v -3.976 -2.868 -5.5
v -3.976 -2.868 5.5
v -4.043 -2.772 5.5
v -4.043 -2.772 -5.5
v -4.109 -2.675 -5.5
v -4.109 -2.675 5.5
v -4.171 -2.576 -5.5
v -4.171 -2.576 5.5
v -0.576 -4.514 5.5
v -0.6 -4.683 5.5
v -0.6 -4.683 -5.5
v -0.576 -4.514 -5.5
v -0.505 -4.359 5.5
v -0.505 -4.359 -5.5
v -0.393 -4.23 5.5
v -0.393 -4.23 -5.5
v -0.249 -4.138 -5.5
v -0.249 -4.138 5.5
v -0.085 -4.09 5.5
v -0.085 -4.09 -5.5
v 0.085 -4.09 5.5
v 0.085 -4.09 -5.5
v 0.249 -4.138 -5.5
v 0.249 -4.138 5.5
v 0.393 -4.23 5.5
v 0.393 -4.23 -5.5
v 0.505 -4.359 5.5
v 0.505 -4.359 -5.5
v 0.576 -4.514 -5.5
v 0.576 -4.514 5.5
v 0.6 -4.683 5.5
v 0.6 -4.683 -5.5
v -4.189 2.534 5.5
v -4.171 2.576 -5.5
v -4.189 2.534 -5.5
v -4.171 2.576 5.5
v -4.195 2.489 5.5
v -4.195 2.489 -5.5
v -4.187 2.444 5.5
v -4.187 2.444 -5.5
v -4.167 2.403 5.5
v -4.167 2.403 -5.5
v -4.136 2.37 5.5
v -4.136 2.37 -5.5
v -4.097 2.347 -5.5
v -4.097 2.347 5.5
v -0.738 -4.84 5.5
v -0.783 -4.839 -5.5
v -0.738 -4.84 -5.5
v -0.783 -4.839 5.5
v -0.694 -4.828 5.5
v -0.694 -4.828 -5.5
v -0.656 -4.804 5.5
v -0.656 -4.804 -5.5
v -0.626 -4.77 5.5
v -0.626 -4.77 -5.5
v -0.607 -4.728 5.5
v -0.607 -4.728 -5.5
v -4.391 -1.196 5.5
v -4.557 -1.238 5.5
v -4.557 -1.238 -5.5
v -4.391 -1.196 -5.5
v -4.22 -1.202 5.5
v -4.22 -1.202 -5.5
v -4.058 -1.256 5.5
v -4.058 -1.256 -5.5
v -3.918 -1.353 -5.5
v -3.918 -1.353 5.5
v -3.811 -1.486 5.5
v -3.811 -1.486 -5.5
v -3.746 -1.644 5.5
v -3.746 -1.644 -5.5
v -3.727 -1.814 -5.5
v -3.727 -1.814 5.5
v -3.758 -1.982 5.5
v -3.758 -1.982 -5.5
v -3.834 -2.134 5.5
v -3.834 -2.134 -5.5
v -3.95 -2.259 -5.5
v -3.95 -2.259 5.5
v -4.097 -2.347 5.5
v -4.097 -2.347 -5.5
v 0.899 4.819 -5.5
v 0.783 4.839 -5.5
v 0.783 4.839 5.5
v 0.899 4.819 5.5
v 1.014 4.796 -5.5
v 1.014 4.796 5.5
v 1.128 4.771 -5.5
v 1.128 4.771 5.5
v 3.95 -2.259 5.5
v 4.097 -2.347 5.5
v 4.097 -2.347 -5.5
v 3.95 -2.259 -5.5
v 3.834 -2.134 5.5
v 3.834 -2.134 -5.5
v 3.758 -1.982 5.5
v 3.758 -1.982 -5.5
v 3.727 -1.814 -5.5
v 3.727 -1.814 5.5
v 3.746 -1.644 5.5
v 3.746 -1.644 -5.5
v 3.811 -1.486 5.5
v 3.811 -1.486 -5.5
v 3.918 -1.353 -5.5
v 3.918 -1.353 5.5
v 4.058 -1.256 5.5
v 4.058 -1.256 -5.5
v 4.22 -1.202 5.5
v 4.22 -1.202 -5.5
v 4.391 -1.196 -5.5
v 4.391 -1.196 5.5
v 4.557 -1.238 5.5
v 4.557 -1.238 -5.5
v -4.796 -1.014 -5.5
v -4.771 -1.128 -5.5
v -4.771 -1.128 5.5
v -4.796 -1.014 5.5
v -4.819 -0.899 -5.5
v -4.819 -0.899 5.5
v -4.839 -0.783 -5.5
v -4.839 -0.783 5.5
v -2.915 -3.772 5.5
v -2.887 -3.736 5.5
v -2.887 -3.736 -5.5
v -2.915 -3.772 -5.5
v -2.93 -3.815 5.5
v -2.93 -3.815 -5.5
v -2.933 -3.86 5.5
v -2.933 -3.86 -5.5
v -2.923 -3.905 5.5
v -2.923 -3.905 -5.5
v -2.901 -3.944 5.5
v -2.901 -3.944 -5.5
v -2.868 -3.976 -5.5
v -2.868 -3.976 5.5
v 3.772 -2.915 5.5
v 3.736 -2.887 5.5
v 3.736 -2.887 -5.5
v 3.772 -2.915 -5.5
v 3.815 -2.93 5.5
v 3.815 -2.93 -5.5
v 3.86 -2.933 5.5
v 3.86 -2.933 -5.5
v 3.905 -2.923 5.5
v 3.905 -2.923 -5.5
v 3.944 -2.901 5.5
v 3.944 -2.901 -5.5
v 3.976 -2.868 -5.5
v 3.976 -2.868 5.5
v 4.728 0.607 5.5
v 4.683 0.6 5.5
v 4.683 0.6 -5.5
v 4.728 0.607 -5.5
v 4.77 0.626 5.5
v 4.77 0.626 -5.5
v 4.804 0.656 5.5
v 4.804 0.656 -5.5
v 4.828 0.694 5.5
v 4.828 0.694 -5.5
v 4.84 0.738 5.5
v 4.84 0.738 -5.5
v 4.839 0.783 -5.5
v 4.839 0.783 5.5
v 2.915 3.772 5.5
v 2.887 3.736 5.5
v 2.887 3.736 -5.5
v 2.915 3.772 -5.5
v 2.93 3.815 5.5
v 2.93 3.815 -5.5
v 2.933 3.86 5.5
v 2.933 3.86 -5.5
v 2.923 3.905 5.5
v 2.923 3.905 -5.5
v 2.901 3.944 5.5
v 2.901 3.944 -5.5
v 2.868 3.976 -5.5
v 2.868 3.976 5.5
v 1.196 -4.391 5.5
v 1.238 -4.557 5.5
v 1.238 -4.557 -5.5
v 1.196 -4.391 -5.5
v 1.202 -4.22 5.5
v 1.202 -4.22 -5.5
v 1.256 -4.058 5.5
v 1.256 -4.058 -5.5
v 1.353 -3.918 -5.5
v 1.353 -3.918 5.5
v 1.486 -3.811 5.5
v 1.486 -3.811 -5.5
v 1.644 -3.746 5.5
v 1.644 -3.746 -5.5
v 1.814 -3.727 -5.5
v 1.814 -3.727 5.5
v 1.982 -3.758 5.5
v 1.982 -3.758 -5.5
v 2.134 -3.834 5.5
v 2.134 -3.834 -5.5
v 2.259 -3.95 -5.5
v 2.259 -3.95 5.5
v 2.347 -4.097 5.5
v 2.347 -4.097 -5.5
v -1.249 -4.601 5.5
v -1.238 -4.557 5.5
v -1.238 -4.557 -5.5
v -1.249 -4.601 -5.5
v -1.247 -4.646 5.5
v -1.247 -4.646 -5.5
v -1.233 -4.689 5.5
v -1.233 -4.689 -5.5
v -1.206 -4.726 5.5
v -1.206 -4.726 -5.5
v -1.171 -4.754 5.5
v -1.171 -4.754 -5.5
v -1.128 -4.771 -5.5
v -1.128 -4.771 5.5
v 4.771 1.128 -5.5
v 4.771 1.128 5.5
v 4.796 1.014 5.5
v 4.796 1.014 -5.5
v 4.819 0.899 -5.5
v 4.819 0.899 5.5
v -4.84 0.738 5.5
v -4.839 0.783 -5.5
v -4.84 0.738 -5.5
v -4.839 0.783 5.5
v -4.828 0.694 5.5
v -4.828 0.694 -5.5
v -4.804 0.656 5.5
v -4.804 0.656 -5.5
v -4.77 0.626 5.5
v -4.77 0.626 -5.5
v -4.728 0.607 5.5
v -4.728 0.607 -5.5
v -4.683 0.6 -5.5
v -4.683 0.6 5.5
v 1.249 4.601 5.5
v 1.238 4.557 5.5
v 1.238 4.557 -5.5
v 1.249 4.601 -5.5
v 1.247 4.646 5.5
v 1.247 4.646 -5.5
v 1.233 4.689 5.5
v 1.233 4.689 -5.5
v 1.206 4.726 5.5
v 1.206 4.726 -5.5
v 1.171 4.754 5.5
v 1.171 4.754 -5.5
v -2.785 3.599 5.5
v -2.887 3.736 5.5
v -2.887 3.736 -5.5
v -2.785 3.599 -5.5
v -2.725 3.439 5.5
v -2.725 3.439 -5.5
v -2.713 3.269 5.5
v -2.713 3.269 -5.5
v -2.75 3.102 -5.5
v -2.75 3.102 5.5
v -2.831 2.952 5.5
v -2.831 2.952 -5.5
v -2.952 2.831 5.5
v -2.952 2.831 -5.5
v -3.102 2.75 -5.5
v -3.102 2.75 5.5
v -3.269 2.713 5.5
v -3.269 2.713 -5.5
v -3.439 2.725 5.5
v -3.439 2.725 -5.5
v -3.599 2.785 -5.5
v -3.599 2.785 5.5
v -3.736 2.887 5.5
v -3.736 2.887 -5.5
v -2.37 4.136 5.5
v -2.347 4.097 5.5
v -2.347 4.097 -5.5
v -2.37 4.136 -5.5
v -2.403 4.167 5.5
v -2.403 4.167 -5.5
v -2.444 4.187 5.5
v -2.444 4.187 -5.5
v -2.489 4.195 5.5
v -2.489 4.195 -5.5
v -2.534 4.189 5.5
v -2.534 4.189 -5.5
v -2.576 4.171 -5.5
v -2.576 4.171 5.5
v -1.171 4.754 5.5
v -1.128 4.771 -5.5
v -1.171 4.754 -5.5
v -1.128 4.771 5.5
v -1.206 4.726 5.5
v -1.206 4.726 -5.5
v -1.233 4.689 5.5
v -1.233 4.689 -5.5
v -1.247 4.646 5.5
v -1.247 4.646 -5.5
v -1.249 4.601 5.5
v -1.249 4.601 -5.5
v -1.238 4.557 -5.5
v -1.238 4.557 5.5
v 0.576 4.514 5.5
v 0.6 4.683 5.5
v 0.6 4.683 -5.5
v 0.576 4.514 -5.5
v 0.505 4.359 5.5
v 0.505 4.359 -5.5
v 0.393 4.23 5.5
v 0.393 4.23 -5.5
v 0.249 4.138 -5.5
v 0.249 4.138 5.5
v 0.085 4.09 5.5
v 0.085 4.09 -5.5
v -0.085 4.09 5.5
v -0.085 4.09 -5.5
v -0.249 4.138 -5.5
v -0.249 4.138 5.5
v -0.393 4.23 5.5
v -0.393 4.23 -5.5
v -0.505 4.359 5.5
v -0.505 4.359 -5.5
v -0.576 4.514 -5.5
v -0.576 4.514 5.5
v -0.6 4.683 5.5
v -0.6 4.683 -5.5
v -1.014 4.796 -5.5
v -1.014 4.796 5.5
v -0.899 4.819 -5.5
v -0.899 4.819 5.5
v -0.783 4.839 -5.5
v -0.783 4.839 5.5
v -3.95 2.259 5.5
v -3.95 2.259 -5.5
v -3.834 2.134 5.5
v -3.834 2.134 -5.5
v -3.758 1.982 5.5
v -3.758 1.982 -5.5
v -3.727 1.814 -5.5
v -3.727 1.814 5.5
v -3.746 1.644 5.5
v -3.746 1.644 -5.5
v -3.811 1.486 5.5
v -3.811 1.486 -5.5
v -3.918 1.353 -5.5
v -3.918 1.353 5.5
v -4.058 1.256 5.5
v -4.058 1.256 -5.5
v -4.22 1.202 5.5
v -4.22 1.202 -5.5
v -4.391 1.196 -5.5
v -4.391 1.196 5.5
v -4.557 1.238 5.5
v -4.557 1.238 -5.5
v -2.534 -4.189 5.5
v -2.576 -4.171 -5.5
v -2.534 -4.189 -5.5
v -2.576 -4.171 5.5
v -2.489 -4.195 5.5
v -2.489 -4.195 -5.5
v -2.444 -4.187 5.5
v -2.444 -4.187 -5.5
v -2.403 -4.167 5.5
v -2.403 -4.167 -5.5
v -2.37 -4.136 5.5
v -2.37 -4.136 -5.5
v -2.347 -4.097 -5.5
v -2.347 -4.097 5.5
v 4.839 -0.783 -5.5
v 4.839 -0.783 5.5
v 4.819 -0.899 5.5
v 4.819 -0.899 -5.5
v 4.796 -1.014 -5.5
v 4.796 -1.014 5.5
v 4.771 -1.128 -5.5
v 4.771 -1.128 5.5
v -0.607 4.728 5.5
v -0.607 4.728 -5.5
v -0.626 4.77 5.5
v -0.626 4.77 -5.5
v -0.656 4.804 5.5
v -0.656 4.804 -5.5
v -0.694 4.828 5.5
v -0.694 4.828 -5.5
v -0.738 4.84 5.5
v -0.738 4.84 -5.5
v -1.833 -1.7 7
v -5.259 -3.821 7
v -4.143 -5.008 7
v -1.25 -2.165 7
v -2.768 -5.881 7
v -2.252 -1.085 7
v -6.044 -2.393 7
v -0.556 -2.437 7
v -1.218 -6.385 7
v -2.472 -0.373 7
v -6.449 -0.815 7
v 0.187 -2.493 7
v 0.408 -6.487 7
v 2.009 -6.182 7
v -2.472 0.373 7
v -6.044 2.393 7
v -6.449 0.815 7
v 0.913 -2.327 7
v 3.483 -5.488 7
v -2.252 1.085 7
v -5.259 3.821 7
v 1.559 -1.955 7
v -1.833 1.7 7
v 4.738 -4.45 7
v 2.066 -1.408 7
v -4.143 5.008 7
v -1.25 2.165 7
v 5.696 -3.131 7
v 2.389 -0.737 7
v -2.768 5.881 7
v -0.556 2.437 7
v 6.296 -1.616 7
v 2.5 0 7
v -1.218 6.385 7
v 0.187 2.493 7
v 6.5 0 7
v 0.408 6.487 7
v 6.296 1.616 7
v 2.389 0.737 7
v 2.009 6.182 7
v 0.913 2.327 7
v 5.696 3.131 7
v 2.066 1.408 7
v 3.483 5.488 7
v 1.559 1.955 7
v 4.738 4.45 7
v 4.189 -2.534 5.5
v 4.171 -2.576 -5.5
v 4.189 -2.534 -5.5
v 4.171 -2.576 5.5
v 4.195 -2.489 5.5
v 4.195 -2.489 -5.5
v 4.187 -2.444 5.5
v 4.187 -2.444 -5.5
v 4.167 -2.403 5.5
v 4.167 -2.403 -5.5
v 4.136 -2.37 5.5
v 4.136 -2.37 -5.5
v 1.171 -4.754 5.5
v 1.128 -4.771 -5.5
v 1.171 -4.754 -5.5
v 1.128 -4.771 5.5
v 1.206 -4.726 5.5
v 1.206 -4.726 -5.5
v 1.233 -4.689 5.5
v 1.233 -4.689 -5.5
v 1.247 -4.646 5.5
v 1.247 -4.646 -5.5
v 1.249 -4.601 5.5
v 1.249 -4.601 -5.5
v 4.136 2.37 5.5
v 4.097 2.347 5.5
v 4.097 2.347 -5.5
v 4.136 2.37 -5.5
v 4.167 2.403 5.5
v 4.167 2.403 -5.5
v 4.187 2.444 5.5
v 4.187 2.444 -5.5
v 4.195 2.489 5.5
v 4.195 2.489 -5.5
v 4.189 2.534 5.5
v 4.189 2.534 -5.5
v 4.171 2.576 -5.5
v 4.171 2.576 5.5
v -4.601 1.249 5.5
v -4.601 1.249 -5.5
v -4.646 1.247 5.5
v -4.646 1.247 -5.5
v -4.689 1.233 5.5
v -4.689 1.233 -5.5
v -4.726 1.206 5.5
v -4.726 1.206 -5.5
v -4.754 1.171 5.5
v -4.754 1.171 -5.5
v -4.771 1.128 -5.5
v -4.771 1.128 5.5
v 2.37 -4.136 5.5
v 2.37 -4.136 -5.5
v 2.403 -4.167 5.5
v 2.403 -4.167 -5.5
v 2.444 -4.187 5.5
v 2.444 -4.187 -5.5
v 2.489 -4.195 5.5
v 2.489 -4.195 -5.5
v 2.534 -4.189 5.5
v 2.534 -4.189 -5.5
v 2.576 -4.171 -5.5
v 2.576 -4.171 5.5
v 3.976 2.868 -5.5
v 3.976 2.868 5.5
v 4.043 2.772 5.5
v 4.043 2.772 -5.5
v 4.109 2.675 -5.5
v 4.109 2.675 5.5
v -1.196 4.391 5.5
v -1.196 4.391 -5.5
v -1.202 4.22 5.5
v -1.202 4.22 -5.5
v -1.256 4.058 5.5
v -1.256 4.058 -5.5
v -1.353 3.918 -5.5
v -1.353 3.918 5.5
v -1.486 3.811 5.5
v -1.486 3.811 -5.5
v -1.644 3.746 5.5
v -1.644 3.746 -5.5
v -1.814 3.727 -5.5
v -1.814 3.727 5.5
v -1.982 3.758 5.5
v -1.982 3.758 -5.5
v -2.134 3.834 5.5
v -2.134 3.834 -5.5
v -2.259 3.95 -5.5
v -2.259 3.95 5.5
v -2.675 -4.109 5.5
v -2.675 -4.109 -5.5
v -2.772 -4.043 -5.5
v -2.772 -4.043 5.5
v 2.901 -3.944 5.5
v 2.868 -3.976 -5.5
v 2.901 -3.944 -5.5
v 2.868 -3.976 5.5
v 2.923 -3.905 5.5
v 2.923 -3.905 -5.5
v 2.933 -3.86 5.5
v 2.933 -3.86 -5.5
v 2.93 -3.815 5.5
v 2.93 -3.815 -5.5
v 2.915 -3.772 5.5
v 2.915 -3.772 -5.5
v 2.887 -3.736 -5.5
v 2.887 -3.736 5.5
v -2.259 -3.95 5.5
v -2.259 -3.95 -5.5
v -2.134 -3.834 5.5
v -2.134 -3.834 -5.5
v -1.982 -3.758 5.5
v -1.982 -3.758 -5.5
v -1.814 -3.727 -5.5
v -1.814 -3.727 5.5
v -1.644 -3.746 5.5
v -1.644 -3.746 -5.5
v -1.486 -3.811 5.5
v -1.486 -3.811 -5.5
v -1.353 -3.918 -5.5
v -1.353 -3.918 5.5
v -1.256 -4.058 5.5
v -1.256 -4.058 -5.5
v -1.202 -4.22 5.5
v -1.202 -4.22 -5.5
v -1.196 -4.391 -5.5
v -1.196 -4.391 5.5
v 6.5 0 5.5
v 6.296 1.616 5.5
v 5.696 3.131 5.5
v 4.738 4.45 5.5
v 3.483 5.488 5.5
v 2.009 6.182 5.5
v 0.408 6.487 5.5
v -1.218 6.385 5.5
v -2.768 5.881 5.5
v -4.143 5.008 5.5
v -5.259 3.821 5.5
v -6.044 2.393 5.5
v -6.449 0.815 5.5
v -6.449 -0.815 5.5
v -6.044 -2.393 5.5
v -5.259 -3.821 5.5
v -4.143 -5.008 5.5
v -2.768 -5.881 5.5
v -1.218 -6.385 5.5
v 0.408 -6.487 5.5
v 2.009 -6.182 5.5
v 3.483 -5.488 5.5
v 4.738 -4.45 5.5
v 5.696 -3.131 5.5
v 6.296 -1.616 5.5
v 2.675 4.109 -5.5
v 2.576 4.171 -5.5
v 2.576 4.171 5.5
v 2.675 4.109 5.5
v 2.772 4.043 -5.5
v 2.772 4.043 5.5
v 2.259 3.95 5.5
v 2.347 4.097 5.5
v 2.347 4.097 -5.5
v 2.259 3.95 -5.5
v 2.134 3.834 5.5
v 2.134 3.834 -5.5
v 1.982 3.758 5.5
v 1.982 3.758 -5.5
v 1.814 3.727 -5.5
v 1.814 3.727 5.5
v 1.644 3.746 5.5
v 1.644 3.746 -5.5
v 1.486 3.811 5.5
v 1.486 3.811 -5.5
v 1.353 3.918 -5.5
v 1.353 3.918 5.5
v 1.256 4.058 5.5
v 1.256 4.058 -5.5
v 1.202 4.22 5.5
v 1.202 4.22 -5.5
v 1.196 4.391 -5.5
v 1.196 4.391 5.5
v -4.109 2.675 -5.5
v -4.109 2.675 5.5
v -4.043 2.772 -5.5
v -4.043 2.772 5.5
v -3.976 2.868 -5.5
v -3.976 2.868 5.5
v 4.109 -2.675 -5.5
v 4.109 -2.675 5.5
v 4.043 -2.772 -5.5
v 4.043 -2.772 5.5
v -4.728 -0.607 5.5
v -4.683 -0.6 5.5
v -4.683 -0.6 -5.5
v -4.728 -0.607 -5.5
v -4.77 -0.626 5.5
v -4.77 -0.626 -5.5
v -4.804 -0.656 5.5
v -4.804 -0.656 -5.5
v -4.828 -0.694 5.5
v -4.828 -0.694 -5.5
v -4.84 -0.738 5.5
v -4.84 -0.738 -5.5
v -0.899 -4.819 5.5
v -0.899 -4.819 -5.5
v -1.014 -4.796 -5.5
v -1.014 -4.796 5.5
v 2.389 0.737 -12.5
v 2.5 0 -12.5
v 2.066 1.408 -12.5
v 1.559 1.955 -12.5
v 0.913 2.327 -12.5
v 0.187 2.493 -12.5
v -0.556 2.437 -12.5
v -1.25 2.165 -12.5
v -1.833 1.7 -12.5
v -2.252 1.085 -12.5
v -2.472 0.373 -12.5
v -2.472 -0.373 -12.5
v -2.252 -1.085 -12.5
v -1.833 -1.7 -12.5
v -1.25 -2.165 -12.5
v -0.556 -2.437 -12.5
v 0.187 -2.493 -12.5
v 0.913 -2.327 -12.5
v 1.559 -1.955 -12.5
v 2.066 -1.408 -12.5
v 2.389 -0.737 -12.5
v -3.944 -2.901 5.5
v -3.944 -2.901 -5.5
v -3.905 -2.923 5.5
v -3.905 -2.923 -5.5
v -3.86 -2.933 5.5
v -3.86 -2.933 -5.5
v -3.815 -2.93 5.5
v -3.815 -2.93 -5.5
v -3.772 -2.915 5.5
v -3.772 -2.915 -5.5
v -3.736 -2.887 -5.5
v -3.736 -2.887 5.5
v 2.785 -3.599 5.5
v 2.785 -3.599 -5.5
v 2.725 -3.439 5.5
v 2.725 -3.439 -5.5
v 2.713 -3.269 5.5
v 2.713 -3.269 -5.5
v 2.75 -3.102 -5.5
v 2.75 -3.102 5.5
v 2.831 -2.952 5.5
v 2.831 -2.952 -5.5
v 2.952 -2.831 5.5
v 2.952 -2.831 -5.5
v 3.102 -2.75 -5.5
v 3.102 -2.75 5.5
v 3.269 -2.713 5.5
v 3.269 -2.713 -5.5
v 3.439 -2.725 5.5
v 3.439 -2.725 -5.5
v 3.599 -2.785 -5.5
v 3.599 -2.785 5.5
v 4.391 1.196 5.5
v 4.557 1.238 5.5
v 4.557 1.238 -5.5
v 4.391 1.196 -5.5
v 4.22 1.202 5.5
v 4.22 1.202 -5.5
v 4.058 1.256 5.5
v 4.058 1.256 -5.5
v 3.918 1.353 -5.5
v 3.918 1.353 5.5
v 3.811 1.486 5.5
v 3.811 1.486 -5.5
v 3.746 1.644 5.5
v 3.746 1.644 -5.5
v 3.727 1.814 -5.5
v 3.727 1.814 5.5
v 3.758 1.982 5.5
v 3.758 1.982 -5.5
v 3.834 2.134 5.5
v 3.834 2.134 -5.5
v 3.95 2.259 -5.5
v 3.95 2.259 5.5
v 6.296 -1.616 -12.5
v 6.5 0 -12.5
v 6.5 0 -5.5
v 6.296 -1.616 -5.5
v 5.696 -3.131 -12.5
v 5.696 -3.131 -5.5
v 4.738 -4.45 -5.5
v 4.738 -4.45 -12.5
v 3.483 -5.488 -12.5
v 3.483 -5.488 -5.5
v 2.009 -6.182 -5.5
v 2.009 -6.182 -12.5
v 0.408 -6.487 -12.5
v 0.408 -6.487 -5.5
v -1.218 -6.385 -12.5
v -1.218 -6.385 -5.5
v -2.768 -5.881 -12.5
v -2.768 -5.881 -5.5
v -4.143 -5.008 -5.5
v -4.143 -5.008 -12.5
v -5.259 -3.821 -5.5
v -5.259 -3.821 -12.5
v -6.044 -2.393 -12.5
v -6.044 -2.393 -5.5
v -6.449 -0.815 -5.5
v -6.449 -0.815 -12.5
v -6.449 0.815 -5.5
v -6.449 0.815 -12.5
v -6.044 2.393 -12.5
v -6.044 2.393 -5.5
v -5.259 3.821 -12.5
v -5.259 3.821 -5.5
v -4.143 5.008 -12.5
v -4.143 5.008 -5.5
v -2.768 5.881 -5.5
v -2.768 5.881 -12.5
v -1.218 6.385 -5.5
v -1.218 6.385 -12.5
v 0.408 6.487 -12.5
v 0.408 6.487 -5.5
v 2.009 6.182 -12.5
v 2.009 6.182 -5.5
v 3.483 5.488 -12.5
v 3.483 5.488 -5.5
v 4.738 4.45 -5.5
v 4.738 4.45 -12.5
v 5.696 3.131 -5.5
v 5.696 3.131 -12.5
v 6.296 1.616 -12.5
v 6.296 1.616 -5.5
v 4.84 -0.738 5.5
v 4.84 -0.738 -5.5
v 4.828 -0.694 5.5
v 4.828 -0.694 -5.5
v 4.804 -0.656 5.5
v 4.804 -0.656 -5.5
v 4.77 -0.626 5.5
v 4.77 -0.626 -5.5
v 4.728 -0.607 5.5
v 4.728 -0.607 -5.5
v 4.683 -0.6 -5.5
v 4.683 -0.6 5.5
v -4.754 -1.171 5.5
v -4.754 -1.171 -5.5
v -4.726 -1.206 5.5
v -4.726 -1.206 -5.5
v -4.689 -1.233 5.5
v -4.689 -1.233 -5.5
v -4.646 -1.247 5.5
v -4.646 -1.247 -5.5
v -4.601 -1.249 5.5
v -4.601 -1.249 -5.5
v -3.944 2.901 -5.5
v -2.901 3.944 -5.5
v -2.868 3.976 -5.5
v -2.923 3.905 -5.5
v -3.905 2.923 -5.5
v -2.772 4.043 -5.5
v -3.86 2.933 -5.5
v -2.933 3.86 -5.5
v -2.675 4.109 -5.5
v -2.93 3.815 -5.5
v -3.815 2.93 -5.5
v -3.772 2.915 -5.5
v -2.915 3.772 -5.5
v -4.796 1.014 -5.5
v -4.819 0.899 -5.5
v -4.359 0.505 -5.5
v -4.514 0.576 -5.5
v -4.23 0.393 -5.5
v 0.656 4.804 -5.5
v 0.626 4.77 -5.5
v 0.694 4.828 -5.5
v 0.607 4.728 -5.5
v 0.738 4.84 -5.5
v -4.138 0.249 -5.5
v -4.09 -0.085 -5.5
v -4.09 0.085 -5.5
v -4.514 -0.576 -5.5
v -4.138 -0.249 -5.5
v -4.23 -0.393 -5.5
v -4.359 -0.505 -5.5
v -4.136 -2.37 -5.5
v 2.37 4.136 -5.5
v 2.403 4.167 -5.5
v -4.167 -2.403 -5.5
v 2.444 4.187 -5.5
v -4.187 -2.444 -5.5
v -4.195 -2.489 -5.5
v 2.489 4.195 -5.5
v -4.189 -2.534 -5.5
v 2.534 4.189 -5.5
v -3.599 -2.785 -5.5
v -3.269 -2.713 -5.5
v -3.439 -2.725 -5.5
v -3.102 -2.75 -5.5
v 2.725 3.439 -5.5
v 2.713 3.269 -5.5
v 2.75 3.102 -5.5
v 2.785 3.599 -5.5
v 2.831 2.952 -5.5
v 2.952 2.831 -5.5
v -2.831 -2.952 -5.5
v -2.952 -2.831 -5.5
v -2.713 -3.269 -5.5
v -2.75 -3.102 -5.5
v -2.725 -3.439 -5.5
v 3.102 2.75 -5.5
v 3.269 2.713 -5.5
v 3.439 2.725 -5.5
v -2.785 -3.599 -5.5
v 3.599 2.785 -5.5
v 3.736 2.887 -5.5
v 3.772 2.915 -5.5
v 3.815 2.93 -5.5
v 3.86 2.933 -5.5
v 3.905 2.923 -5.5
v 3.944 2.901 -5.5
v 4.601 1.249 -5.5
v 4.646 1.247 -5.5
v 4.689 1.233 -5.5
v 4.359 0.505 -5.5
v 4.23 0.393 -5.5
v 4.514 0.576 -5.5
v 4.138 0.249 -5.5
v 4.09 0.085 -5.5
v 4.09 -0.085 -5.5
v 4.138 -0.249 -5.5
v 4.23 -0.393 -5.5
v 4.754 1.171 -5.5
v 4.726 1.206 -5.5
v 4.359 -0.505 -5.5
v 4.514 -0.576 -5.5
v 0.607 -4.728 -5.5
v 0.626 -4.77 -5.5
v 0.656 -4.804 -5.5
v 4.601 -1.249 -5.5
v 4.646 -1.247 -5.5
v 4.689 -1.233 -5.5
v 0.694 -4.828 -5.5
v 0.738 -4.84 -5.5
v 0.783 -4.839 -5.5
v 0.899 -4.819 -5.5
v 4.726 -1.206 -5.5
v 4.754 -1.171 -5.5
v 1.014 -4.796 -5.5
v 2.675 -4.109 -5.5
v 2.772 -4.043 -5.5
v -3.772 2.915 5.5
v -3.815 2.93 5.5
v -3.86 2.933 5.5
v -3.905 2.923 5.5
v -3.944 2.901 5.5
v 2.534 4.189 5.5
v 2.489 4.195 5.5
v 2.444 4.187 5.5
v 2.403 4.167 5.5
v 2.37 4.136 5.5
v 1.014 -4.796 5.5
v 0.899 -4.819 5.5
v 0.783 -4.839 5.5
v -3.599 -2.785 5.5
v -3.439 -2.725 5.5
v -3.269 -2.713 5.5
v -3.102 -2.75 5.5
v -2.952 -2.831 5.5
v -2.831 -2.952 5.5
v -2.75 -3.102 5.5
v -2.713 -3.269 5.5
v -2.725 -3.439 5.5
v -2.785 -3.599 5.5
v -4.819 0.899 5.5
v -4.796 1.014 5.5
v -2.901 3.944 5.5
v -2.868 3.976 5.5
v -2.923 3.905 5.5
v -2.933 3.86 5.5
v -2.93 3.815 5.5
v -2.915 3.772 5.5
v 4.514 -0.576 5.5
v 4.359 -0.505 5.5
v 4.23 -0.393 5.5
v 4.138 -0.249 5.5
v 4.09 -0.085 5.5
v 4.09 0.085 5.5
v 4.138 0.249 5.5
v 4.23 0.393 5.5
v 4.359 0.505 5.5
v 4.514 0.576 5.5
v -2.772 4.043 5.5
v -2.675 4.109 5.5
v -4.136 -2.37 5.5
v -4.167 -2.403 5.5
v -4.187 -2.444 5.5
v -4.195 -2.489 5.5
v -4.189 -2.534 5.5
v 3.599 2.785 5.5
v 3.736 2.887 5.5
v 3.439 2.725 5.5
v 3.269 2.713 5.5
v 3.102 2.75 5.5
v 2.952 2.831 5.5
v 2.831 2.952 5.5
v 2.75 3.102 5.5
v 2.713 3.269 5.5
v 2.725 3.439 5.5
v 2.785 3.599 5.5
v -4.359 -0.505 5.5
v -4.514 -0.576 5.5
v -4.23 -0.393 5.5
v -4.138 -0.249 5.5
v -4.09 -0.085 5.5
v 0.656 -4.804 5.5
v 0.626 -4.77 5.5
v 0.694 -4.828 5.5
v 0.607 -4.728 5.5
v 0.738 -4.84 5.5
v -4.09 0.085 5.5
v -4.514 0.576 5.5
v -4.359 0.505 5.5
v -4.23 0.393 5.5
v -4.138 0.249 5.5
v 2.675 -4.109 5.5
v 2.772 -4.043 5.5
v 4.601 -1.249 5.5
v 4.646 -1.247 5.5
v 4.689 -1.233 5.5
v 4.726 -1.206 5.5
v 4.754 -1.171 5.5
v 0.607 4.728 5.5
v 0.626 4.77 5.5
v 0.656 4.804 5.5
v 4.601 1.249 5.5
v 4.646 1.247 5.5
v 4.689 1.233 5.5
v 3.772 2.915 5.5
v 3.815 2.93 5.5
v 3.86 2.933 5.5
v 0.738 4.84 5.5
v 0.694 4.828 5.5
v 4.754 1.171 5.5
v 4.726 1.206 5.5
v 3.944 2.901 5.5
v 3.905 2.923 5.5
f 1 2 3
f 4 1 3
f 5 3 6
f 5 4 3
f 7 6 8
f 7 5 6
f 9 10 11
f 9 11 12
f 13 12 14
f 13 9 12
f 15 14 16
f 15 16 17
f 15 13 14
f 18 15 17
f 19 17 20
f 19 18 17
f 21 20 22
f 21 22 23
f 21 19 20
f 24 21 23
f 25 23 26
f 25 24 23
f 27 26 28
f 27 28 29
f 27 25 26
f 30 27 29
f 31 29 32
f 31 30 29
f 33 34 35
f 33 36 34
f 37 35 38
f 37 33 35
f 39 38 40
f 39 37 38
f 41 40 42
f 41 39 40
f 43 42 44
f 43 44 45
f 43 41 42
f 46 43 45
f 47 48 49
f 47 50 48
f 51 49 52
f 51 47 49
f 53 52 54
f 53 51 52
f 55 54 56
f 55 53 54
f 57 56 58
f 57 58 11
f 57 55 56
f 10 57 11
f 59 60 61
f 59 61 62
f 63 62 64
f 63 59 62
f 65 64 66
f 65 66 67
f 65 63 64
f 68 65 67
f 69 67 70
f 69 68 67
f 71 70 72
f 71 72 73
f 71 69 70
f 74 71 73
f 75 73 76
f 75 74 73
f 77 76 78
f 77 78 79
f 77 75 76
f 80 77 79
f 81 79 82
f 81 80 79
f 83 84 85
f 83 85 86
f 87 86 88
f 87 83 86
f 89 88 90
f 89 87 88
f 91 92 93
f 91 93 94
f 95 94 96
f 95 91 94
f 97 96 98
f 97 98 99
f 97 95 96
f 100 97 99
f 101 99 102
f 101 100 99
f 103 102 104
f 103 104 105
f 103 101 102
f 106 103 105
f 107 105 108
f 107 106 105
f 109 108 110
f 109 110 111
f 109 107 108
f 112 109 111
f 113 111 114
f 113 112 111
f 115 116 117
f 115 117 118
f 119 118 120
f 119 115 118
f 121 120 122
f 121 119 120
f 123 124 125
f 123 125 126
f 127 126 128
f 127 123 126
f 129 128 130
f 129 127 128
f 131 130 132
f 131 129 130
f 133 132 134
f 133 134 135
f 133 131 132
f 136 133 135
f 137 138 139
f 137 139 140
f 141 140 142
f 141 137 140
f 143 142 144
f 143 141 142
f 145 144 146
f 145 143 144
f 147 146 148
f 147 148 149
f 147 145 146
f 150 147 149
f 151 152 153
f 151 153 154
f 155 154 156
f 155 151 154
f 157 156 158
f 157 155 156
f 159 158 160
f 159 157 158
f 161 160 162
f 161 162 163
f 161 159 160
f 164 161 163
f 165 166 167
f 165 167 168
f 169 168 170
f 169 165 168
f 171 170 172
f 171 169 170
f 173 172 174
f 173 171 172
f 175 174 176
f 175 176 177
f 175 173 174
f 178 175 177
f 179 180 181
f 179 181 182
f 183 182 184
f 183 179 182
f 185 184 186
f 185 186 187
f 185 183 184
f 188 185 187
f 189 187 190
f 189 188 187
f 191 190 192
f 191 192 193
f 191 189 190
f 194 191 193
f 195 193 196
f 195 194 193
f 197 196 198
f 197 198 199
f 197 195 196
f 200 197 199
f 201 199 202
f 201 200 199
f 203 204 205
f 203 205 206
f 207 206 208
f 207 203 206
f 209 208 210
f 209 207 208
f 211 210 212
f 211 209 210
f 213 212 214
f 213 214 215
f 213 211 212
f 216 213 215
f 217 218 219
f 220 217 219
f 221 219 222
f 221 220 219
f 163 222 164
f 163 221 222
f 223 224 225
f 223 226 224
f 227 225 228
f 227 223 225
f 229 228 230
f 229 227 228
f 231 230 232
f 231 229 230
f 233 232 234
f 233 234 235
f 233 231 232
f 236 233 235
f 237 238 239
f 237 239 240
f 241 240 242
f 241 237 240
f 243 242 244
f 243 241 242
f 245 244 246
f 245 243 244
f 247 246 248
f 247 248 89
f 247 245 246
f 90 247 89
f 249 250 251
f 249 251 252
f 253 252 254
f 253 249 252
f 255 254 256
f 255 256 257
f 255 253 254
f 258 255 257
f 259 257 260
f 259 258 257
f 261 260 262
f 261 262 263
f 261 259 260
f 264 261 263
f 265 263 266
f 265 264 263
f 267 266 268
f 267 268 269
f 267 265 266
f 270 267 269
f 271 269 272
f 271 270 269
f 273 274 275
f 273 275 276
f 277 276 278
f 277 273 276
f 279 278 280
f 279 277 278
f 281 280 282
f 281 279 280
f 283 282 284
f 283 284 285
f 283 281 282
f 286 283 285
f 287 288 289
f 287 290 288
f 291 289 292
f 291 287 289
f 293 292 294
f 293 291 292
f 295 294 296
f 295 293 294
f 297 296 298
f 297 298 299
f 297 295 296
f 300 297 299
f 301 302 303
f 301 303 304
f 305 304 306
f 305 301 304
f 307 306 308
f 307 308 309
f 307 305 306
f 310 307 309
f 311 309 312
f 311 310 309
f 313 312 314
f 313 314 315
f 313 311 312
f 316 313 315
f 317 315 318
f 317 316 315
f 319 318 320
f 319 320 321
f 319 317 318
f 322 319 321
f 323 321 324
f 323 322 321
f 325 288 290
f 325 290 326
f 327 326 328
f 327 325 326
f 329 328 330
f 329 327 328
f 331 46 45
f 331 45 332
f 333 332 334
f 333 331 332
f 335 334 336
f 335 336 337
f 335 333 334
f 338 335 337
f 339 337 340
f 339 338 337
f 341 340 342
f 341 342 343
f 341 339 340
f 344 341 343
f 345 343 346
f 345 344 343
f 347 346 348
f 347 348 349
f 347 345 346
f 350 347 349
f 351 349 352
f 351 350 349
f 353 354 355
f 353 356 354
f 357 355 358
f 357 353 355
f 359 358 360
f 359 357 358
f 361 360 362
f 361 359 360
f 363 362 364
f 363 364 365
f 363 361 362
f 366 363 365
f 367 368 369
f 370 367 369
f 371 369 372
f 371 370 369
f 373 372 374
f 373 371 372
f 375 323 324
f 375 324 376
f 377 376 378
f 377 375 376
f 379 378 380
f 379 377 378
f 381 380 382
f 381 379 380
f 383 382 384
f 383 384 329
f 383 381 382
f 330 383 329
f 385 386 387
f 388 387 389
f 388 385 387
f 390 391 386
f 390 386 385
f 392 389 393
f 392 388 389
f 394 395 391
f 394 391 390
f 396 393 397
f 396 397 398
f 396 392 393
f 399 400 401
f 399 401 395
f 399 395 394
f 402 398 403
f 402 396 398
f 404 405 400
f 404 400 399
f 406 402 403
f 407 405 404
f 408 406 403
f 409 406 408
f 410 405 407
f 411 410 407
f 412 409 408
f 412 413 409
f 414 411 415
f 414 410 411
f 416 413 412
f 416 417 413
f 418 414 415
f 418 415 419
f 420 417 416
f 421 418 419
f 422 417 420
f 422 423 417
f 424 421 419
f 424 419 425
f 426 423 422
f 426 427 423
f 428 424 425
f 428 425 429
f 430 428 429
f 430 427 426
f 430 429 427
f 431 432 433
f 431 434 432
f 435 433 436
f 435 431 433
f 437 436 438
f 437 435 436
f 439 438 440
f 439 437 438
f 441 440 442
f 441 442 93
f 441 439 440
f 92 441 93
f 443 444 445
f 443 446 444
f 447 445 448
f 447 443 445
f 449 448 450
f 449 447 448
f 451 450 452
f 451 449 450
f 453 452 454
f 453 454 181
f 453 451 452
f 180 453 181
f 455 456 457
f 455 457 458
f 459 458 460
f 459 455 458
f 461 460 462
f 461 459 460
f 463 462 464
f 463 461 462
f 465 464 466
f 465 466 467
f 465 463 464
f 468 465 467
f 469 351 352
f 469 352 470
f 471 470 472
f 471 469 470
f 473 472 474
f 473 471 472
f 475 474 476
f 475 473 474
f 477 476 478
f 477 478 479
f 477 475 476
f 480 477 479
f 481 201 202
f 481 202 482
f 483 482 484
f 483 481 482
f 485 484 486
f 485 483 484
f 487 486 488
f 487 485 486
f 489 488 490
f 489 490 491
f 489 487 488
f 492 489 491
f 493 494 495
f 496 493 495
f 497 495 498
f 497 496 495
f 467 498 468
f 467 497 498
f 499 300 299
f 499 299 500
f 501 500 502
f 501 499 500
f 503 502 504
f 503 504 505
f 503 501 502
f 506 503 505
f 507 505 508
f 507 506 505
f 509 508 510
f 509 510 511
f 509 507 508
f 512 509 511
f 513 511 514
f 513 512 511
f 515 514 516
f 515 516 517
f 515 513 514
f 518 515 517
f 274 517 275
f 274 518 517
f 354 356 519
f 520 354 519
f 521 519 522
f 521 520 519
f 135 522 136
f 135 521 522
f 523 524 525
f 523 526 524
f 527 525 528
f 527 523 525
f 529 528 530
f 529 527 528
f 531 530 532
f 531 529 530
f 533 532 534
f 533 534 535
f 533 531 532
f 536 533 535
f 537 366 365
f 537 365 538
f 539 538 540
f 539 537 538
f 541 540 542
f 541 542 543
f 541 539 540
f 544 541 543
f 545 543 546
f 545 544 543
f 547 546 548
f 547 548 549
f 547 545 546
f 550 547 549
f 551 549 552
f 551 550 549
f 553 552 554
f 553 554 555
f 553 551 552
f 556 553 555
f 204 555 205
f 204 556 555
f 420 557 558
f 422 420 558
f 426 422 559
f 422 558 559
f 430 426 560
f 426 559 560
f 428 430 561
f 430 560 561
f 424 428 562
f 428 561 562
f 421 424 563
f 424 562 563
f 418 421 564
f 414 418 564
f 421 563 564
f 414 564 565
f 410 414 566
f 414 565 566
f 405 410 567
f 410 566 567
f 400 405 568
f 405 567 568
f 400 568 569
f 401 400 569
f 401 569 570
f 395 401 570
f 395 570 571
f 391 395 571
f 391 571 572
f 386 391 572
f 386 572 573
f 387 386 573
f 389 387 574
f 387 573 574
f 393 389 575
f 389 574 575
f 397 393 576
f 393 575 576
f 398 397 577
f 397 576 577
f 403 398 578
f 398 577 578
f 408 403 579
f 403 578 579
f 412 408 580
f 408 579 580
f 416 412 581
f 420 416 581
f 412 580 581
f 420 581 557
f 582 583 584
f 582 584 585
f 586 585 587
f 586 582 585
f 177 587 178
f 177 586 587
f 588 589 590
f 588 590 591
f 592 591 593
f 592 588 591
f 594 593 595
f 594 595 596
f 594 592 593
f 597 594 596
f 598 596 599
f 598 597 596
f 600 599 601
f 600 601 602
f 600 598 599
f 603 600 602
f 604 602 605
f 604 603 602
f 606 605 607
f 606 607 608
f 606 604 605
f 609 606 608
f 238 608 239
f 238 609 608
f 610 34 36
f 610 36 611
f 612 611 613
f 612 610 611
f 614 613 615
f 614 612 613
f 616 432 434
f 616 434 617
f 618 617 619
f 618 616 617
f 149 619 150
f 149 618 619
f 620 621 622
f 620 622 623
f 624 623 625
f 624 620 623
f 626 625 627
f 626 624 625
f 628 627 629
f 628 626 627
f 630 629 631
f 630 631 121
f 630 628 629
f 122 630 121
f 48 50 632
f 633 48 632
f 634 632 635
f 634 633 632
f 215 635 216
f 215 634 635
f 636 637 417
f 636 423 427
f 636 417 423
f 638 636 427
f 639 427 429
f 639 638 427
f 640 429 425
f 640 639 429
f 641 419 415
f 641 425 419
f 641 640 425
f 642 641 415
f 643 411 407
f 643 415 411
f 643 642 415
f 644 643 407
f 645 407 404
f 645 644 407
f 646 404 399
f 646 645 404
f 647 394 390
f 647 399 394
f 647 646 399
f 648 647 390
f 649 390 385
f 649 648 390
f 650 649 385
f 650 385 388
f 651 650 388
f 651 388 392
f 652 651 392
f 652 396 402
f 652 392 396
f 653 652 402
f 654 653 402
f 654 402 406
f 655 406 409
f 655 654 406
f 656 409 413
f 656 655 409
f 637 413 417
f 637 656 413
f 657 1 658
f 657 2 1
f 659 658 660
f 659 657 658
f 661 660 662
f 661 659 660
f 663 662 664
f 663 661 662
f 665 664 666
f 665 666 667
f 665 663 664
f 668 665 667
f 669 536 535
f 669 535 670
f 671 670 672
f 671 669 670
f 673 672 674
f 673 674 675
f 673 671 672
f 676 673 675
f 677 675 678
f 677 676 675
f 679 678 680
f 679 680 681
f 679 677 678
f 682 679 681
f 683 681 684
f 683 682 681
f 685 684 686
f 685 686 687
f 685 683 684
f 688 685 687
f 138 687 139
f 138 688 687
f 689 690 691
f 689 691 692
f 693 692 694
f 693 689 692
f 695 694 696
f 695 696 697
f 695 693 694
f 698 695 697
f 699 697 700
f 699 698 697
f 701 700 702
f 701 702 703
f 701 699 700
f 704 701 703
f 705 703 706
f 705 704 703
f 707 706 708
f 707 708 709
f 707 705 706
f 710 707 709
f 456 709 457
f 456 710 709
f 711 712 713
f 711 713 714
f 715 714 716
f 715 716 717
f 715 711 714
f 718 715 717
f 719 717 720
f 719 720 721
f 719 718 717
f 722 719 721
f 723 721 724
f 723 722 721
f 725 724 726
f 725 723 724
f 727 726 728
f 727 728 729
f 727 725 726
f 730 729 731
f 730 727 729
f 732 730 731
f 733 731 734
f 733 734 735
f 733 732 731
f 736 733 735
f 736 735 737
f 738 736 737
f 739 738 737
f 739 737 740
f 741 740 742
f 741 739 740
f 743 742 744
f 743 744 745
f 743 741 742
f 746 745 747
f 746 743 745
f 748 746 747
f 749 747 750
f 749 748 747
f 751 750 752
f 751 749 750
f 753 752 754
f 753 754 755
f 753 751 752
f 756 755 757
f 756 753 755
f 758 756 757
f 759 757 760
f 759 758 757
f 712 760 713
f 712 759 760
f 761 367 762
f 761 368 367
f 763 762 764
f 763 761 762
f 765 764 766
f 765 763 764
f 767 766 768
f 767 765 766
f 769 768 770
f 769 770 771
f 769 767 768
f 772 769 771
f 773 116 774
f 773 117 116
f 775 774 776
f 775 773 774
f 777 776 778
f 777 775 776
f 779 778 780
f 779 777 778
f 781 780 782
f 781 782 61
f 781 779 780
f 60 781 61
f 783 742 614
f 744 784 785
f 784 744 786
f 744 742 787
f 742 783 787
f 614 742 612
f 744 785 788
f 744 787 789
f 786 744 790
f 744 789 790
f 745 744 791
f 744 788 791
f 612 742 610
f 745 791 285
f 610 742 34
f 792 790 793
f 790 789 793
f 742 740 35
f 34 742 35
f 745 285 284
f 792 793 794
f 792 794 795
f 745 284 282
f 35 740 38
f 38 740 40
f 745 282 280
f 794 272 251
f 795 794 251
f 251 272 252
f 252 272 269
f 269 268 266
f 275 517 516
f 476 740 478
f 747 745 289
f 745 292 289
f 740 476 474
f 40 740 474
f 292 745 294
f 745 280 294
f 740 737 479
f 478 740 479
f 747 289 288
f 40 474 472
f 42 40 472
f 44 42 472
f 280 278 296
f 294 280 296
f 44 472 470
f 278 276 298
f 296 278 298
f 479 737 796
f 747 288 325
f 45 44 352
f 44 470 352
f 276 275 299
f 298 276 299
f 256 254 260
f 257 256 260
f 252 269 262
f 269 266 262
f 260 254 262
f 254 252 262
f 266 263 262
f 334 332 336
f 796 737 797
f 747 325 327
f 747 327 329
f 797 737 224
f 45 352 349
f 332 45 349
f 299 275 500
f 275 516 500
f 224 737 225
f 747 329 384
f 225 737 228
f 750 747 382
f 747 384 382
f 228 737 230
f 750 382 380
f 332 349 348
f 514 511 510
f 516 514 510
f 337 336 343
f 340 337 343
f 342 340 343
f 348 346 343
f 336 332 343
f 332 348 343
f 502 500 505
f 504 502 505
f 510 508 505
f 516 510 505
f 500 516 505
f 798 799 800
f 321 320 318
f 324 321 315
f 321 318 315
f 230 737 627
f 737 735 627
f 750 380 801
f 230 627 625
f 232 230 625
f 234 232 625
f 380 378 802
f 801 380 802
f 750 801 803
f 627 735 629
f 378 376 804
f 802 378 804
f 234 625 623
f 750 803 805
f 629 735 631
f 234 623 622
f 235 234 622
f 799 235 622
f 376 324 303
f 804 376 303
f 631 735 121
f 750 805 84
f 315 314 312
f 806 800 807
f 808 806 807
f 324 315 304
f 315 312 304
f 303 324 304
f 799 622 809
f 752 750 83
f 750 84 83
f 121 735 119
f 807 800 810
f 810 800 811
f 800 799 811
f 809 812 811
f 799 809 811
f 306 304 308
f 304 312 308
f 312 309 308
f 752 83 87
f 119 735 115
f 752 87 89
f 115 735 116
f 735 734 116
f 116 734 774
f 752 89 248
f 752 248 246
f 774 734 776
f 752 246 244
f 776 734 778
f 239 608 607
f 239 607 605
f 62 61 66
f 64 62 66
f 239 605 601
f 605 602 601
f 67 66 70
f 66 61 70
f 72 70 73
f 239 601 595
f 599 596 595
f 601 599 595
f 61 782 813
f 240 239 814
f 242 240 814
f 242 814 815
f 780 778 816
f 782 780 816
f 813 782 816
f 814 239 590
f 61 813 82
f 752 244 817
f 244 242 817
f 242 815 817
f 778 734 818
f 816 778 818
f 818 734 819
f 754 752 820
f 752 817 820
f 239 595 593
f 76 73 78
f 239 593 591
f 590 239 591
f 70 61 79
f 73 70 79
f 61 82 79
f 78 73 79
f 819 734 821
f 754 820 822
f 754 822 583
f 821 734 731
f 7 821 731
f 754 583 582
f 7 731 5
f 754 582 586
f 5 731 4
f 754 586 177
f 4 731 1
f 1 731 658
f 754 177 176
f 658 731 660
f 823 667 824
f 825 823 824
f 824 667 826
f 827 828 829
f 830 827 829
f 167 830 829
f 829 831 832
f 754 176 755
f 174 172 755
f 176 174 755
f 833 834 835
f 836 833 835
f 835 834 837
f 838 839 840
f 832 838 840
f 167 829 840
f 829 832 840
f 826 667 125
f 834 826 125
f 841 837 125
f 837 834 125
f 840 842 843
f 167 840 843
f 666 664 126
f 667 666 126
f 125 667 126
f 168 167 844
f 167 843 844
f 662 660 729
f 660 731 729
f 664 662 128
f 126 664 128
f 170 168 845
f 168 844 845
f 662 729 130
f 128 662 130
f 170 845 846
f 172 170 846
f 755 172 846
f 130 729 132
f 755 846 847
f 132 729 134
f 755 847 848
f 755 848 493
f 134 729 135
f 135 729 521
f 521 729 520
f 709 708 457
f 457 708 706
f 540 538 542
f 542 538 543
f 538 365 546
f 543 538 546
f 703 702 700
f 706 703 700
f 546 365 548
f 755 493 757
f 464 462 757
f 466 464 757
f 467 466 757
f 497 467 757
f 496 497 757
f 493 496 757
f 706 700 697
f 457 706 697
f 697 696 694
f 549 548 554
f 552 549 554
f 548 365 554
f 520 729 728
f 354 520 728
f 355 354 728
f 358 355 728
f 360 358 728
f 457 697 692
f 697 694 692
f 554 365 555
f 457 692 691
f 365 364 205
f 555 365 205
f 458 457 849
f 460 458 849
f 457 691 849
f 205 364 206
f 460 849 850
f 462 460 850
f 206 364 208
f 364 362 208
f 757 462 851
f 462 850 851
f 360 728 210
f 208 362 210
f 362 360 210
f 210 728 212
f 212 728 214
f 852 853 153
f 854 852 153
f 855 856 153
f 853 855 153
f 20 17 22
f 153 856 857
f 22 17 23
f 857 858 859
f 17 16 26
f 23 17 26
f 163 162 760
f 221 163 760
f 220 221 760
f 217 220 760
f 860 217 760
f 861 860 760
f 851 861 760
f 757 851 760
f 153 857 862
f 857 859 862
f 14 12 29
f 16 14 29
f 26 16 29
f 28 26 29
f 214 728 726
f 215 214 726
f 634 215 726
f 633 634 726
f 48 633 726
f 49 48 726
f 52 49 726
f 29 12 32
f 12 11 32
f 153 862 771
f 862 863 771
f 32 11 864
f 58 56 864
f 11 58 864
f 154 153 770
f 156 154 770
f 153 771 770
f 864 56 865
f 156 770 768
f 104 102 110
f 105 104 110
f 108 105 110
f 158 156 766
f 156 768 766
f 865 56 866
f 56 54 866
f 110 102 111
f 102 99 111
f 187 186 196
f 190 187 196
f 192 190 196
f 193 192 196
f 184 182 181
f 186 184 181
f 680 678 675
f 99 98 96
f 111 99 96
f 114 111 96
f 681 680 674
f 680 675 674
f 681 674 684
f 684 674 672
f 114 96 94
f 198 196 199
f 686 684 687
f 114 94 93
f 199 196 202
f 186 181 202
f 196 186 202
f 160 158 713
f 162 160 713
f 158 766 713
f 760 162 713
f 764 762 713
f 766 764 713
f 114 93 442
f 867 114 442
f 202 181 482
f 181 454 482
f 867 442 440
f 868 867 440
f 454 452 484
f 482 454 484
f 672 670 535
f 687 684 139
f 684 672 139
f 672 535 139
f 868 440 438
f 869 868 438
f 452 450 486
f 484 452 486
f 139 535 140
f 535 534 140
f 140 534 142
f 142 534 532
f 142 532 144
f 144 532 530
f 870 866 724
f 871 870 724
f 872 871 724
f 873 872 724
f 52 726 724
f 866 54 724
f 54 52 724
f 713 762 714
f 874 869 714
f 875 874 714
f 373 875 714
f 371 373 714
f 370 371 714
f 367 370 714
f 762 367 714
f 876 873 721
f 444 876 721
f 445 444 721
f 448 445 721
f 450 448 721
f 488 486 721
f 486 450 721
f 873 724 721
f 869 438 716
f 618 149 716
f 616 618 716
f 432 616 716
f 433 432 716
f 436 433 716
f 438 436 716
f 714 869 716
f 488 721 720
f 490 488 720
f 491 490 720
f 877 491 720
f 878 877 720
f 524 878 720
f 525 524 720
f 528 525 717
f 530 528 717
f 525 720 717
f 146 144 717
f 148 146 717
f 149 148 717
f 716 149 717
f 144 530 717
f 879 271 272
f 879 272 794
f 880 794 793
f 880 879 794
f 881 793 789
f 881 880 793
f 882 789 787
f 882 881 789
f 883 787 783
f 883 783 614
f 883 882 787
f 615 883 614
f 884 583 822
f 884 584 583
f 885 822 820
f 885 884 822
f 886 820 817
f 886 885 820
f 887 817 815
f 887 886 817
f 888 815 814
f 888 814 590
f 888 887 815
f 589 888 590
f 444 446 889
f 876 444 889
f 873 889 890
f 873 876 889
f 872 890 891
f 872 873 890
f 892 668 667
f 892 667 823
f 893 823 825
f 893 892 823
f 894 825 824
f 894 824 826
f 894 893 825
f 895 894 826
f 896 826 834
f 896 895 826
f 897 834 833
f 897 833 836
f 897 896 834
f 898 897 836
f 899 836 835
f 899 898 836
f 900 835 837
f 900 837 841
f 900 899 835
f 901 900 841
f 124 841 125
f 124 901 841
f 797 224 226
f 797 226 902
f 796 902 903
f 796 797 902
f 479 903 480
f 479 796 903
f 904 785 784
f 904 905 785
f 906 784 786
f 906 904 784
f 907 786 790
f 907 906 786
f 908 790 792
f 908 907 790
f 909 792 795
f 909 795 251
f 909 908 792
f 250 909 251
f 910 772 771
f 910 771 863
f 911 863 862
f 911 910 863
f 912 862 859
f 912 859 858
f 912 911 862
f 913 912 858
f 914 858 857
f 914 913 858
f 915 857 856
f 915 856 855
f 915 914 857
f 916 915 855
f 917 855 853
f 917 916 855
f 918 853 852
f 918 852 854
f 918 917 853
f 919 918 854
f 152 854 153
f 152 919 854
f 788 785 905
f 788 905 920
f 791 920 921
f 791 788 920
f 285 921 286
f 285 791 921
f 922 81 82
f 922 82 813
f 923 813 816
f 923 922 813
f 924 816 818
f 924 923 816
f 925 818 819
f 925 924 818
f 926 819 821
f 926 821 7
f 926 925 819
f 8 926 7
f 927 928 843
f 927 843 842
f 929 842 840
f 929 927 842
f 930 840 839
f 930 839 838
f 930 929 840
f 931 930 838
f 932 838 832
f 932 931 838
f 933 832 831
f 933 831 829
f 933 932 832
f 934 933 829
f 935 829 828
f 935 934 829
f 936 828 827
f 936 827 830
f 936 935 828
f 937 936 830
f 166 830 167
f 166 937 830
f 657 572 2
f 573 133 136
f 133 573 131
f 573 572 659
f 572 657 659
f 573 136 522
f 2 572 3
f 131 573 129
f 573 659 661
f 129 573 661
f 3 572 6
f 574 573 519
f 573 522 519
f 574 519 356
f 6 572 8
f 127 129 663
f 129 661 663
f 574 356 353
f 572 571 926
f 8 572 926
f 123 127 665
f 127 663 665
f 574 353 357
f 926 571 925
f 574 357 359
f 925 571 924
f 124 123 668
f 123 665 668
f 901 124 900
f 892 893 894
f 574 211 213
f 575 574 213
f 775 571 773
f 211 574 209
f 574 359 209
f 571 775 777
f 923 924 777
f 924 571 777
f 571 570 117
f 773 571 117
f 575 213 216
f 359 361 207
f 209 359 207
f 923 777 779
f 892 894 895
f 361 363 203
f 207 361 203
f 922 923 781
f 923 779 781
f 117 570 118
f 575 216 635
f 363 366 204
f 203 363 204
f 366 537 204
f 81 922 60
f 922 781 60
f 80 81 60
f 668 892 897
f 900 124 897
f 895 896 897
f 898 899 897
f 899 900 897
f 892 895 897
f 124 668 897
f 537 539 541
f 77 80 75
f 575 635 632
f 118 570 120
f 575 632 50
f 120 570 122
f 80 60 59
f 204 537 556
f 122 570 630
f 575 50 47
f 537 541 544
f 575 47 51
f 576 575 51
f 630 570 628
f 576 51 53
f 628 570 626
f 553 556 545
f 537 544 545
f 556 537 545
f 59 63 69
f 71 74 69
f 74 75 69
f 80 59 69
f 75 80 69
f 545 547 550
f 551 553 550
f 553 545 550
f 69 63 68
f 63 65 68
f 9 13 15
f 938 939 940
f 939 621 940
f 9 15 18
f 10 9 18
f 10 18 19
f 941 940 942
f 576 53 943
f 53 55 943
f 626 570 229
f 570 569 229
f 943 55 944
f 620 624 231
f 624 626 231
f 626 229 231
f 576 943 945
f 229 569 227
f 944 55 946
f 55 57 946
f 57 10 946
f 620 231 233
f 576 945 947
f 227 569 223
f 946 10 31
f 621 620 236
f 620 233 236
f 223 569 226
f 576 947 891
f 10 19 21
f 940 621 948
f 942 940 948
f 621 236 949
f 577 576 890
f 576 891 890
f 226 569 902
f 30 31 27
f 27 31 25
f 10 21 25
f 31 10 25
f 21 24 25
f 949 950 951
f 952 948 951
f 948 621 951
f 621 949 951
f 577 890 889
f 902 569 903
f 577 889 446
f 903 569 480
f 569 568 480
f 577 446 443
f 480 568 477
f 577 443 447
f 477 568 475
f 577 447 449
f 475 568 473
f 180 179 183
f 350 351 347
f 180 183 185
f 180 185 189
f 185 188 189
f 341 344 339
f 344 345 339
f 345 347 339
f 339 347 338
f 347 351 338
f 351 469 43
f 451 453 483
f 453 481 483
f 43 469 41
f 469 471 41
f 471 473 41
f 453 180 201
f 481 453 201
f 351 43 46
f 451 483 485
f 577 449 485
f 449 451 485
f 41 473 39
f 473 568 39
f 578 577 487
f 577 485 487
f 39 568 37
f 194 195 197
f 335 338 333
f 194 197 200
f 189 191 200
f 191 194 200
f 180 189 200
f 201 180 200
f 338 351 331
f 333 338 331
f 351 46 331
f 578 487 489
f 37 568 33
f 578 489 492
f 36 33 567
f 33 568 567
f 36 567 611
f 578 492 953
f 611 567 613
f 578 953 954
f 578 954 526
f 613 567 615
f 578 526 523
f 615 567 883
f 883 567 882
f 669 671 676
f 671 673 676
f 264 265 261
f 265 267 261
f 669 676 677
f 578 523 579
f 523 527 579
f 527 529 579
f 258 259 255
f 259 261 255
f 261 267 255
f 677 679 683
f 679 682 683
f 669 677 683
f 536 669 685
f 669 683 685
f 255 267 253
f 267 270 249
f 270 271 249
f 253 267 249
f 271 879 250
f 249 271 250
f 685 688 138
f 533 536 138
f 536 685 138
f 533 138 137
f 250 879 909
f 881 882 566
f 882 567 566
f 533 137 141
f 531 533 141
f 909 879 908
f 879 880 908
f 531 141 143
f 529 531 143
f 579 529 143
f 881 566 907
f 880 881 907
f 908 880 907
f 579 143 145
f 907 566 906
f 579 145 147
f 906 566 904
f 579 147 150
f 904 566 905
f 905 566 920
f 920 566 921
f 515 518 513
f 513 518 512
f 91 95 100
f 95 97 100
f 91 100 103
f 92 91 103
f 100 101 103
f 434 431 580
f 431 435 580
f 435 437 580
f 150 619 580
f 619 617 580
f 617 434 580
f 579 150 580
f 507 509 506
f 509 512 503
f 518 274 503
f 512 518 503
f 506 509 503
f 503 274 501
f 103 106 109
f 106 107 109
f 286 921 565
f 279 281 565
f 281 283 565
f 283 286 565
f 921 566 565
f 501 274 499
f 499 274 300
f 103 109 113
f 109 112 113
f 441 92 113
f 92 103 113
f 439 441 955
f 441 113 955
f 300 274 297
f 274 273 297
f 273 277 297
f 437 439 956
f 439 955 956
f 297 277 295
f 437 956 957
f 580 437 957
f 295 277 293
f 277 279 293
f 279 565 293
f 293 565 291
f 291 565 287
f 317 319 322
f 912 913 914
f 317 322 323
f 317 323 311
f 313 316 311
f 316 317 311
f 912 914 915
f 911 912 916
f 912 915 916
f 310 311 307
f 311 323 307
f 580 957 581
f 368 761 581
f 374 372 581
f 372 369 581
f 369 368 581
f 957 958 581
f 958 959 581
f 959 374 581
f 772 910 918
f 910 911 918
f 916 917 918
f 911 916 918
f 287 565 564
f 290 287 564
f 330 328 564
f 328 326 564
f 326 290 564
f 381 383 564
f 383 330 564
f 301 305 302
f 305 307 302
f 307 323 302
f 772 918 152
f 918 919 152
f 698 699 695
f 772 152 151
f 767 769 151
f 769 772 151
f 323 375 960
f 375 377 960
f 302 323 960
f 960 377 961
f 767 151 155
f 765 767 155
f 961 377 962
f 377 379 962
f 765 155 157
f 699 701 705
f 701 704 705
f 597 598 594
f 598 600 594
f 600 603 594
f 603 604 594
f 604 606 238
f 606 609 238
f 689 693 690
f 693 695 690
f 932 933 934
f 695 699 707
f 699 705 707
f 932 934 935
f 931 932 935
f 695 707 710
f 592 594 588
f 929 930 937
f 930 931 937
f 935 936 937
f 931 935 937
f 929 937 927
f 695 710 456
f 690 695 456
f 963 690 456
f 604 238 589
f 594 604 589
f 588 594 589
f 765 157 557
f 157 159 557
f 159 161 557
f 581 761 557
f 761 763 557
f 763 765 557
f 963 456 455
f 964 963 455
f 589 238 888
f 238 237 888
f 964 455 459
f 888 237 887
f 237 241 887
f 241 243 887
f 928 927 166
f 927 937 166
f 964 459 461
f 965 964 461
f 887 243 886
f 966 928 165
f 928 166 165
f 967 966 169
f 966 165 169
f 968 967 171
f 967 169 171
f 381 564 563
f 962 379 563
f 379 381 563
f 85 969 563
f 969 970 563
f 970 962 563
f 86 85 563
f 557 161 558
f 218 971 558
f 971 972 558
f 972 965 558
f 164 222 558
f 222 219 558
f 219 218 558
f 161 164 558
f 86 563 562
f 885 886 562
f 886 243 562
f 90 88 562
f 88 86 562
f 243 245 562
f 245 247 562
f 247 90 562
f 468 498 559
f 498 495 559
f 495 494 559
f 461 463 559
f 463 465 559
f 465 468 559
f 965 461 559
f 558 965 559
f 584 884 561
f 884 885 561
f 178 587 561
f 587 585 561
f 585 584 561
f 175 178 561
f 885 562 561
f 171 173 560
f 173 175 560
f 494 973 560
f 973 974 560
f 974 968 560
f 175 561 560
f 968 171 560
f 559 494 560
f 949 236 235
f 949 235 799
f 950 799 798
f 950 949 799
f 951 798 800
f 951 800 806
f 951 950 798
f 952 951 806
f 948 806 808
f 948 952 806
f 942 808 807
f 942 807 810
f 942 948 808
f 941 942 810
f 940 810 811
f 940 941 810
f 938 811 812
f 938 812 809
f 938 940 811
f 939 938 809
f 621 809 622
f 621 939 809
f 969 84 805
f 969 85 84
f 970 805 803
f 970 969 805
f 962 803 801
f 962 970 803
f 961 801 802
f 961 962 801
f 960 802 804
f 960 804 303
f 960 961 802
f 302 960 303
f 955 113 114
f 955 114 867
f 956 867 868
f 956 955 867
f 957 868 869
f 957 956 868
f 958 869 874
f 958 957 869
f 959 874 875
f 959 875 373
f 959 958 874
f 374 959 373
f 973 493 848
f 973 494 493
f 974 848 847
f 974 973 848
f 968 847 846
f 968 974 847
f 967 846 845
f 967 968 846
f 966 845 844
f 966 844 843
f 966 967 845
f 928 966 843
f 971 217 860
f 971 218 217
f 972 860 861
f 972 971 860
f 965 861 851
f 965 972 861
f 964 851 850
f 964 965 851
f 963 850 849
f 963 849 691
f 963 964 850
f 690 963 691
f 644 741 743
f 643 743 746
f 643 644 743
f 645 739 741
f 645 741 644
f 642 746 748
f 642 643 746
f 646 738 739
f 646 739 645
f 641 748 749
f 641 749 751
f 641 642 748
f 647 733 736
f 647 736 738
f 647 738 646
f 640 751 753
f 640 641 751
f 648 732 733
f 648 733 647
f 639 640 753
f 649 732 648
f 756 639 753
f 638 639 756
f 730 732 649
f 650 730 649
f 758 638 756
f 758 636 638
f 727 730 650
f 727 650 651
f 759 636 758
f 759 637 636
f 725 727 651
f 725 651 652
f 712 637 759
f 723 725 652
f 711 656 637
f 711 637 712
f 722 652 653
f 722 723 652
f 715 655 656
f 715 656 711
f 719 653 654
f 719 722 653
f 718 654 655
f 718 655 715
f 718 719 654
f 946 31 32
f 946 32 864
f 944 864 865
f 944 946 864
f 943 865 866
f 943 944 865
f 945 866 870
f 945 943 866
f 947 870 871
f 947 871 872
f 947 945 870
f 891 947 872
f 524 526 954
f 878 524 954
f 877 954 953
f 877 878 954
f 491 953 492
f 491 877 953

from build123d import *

# Parameters (mm, degrees)
SKETCHREVOLVEGEARBELT01_W       = 11
SKETCHREVOLVEGEARBELT01_H       = 4.902458105
TOOTHEXTRUDECUTGEARBELT01_DEPTH = 5.5
PATTERNGEARBELT01_COUNT         = 16
SKETCH_5_R                      = 6.5
EXTRUDE_1_DEPTH                 = 1.5
EXTRUDE_START                   = 7
SKETCH_6_R                      = 6.5
EXTRUDE_2_DEPTH                 = 7
CUT_EXTRUDE_2_DEPTH             = 16.516120649
CUT_EXTRUDE_2_DEPTH_BACK        = 16.516120649
SKETCH_7_R                      = 2.5


with BuildPart() as part:
    # SketchRevolveGearBelt01 → GearBelt01 (revolve)
    with BuildSketch(Plane(origin=(0, 0, 0), x_dir=(0, 0, -1), z_dir=(1, 0, 0))):
        with Locations((0, 2.451229053)):
            Rectangle(SKETCHREVOLVEGEARBELT01_W, SKETCHREVOLVEGEARBELT01_H)
    revolve(axis=Axis((0, 0, 5.5), (0, 0, -1)))

    # SketchToothGearBelt01 → ToothExtrudeCutGearBelt01 (cut, symmetric)
    with BuildSketch(Plane.XY):
        with BuildLine():
            Line((-0.783301597, 4.839476633), (0, 7.442458067))
            Line((0, 7.442458067), (0.783301597, 4.839476633))
            ThreePointArc((0.783301597, 4.839476633), (0.655607945, 4.803813062), (0.599999991, 4.683458109))
            ThreePointArc((0.599999991, 4.683458109), (0, 4.083458118), (-0.599999991, 4.683458109))
            ThreePointArc((-0.599999991, 4.683458109), (-0.655607945, 4.803813062), (-0.783301597, 4.839476633))
        make_face()
    toothextrudecutgearbelt01 = extrude(amount=TOOTHEXTRUDECUTGEARBELT01_DEPTH, both=True, mode=Mode.SUBTRACT)

    # PatternGearBelt01: ToothExtrudeCutGearBelt01 ×16 about axis
    patterngearbelt01_axis = Axis((0, 0, 55), (0, 0, -1))
    for i in range(1, PATTERNGEARBELT01_COUNT):
        add(toothextrudecutgearbelt01.rotate(patterngearbelt01_axis, i * 360 / PATTERNGEARBELT01_COUNT), mode=Mode.SUBTRACT)

    # Эскиз5 → Бобышка-Вытянуть1 (add)
    with BuildSketch(Plane.XY.offset(5.5)):
        Circle(SKETCH_5_R)
    extrude(amount=EXTRUDE_1_DEPTH)

    # Эскиз6 → Бобышка-Вытянуть2 (add)
    with BuildSketch(Plane(origin=(0, 0, -5.5), x_dir=(-1, 0, 0), z_dir=(0, 0, -1)).offset(EXTRUDE_START)):
        Circle(SKETCH_6_R)
    extrude(amount=-EXTRUDE_2_DEPTH)

    # Эскиз7 → Вырез-Вытянуть2 (cut, two sides: drawn at the far end of the back side and taken through both)
    with BuildSketch(Plane.XY.offset(-CUT_EXTRUDE_2_DEPTH_BACK)):
        Circle(SKETCH_7_R)
    extrude(amount=CUT_EXTRUDE_2_DEPTH + CUT_EXTRUDE_2_DEPTH_BACK, mode=Mode.SUBTRACT)


solid = part.part
